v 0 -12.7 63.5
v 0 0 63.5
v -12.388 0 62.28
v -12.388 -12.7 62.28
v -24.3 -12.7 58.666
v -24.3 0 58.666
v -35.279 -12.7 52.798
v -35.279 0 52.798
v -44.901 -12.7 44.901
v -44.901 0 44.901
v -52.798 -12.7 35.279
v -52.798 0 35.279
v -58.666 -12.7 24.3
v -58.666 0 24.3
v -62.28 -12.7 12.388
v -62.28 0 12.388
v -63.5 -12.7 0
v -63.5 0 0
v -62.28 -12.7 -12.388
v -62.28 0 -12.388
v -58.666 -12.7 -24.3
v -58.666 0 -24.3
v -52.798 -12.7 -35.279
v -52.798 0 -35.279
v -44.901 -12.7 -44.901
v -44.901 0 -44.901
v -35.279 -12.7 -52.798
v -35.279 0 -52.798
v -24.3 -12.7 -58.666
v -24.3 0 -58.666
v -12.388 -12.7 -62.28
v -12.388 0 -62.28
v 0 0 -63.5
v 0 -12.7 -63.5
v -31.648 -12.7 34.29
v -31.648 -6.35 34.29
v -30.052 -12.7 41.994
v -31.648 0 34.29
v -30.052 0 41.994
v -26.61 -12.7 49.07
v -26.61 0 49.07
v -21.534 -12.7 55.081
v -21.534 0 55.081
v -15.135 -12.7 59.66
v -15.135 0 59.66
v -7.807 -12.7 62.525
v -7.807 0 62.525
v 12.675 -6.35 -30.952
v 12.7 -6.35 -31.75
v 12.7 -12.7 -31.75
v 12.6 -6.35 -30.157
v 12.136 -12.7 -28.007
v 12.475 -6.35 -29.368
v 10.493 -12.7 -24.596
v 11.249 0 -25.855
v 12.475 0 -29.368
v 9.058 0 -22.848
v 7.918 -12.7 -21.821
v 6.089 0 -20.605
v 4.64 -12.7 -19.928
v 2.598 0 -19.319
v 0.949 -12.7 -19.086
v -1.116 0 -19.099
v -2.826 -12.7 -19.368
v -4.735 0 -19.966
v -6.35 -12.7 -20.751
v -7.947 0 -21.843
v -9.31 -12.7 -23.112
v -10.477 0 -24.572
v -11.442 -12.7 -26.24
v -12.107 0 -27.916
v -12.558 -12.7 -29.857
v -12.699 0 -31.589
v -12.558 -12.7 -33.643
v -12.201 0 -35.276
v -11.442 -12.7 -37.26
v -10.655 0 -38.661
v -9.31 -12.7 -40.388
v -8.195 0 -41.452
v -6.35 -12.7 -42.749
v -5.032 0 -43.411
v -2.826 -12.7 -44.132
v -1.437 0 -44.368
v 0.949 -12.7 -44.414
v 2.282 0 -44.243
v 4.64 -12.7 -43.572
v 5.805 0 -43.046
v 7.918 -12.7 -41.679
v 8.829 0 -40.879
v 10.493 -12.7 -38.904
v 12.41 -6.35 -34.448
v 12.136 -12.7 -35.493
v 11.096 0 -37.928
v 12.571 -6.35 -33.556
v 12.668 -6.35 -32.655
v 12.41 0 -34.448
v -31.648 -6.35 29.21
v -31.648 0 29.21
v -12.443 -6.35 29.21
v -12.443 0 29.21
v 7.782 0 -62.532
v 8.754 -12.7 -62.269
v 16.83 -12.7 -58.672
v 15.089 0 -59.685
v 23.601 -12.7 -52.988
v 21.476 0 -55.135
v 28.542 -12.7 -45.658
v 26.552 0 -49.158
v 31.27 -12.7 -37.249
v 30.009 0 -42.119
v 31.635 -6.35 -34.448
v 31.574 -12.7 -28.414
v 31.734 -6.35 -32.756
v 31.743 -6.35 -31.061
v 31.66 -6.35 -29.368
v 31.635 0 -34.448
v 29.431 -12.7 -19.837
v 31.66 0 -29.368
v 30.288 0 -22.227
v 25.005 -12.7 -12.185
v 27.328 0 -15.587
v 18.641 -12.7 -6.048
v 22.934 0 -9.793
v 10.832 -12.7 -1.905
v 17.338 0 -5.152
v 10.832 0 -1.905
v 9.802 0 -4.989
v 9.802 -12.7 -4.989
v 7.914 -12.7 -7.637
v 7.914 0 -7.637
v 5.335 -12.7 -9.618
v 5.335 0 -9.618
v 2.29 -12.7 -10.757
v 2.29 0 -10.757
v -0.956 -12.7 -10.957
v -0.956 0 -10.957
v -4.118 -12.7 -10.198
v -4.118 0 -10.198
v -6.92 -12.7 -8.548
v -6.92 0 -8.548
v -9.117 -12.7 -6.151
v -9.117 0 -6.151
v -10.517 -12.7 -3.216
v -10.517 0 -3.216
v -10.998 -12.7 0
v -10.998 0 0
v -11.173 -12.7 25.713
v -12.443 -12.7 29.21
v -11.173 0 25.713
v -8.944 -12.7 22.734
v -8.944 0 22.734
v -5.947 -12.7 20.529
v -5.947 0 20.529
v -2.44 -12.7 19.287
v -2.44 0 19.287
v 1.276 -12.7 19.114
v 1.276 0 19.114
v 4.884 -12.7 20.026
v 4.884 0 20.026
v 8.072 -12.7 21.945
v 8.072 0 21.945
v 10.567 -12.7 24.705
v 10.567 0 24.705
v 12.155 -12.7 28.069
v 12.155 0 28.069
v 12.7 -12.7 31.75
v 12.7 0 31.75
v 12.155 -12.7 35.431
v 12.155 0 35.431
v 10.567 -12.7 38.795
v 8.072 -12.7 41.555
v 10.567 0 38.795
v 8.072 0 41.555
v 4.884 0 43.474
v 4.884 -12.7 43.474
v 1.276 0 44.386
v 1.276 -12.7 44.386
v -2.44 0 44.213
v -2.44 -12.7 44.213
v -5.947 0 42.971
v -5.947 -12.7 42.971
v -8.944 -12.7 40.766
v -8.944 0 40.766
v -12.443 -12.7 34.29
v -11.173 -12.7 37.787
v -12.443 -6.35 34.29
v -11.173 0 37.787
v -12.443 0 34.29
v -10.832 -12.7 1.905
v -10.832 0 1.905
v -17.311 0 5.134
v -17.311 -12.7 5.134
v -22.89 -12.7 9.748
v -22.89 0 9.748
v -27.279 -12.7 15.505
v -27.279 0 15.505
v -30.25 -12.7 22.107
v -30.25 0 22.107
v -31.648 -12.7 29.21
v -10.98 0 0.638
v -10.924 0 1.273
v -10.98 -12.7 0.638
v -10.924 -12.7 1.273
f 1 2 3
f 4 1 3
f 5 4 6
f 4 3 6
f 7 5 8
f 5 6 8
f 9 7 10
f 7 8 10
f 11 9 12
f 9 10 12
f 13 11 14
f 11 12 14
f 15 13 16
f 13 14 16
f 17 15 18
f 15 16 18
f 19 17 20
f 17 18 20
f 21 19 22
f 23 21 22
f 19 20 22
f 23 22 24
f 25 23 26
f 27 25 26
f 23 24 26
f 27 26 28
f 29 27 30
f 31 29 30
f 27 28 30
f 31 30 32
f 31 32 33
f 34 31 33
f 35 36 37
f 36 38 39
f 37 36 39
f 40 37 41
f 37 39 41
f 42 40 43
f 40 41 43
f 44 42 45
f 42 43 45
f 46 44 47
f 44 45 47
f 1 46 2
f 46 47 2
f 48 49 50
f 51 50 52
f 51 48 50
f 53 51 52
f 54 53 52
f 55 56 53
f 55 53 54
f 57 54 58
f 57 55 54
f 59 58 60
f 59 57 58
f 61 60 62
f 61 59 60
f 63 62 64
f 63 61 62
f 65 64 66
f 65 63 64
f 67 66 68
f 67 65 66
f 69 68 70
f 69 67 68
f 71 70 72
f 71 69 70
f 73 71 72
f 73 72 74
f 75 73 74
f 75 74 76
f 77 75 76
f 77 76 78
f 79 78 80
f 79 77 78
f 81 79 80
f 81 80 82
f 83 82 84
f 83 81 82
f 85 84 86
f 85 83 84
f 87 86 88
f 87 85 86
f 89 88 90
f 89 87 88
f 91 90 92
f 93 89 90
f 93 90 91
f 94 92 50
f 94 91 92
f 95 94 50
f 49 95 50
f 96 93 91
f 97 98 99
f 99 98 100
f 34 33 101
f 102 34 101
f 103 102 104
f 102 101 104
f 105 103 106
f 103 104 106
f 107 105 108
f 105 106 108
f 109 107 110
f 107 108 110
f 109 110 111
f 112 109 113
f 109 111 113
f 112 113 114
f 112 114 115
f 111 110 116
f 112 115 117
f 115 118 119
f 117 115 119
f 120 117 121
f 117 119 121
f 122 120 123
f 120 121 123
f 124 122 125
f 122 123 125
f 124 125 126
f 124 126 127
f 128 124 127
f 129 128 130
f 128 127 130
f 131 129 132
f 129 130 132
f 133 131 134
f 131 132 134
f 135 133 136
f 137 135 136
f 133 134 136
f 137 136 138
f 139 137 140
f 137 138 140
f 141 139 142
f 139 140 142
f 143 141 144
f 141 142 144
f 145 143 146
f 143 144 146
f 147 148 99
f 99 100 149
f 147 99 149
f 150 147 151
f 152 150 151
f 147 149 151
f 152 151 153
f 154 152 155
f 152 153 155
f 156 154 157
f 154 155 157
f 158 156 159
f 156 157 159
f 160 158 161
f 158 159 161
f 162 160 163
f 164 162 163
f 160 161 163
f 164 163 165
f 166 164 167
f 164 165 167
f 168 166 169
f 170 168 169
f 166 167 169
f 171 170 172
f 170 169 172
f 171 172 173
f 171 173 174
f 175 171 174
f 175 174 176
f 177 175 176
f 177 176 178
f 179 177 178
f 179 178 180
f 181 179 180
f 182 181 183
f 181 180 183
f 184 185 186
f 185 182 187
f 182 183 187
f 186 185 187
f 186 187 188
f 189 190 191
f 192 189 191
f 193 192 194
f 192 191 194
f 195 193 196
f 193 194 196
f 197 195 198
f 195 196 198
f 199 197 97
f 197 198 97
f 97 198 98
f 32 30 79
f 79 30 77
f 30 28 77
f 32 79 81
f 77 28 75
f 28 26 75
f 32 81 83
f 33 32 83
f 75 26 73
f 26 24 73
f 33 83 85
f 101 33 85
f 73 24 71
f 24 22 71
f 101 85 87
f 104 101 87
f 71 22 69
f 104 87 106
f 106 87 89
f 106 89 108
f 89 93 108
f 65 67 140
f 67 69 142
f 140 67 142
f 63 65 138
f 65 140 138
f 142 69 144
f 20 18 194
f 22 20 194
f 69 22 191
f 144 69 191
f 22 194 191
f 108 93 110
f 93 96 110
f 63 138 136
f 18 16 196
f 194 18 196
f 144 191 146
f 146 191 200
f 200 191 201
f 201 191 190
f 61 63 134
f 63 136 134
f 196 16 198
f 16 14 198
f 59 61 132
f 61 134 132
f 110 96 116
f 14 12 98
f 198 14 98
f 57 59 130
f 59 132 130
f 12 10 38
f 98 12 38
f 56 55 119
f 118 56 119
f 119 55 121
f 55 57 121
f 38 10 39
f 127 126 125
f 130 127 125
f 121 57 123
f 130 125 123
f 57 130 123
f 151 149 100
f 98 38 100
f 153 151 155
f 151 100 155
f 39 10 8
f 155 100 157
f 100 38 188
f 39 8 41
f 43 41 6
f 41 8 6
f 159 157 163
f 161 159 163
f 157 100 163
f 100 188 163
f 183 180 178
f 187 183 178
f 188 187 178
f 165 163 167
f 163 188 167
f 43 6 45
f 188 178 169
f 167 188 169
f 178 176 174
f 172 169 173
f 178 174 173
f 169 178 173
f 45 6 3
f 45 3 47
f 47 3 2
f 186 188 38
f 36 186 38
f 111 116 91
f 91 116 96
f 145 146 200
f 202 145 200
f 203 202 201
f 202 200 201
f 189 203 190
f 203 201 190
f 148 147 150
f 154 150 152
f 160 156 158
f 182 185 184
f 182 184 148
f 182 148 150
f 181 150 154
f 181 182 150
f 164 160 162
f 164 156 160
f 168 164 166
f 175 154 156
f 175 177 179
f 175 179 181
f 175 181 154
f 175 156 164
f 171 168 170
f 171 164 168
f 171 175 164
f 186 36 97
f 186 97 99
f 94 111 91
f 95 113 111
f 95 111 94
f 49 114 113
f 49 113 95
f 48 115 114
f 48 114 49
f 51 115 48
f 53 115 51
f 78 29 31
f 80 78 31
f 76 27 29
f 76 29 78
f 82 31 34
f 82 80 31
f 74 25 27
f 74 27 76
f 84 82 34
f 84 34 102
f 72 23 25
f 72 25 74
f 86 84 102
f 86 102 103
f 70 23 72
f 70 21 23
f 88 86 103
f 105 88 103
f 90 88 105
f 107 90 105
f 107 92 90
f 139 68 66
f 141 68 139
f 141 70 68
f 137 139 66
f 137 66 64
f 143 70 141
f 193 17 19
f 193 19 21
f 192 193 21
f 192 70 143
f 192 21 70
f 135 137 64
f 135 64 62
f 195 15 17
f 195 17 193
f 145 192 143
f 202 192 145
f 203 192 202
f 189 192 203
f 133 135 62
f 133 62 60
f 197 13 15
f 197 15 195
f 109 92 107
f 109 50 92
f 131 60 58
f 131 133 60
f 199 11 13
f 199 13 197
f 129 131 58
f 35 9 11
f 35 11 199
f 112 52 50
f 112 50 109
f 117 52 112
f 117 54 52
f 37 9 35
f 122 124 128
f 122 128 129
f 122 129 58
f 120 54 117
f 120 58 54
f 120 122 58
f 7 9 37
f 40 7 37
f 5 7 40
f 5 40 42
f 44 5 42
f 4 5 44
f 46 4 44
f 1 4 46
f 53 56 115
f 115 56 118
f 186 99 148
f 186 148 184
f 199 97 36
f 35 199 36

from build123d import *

# Parameters (mm, degrees)
F0_R     = 12.7
F1_DEPTH = 12.7
F3_DEPTH = 6.35
F4_W     = 19.2048290244
F4_H     = 5.08
F5_DEPTH = 6.35
F7_DEPTH = 25.4


with BuildPart() as f1:
    # F0 (on Front) → F1 (new body)
    with BuildSketch(Plane.XZ):
        with BuildLine():
            ThreePointArc((-31.6482369177, 34.29), (-21.5338976964, 55.0813898), (0, 63.5))
            ThreePointArc((0, 63.5), (-63.5, 0), (0, -63.5))
            ThreePointArc((0, -63.5), (31.75, -31.75), (0, 0))
            ThreePointArc((0, 0), (-21.5338976964, 8.4186102), (-31.6482369177, 29.21))
            Line((-31.6482369177, 29.21), (-12.4434078933, 29.21))
            ThreePointArc((-12.4434078933, 29.21), (12.7, 31.75), (-12.4434078933, 34.29))
            Line((-12.4434078933, 34.29), (-31.6482369177, 34.29))
        make_face()
        with Locations((0, -31.75)):
            Circle(F0_R, mode=Mode.SUBTRACT)
    extrude(amount=F1_DEPTH)

    # F2 (on face) → F3 (cut)
    with BuildSketch(Plane(origin=(0, 0, 0), x_dir=(-1, 0, 0), z_dir=(0, 1, 0))):
        with BuildLine():
            ThreePointArc((-12.410179803, -34.4476725629), (-12.6989804051, -31.910924424), (-12.4745547408, -29.3676725629))
            Line((-12.4745547408, -29.3676725629), (-31.6604961424, -29.3676725629))
            ThreePointArc((-31.6604961424, -29.3676725629), (-31.7496059696, -31.9081795626), (-31.6351870983, -34.4476725629))
            Line((-31.6351870983, -34.4476725629), (-12.410179803, -34.4476725629))
        make_face()
    extrude(amount=-F3_DEPTH, mode=Mode.SUBTRACT)

    # F4 (on face) → F5 (cut)
    with BuildSketch(Plane.XZ.offset(12.7)):
        with Locations((-22.0458224055, 31.75)):
            Rectangle(F4_W, F4_H)
    extrude(amount=-F5_DEPTH, mode=Mode.SUBTRACT)

    # F6 (on face) → F7 (cut)
    with BuildSketch(Plane(origin=(0, 0, 0), x_dir=(-1, 0, 0), z_dir=(0, 1, 0))):
        with BuildLine():
            ThreePointArc((-10.8319806145, -1.90488824), (0.9560632943, -10.9565663516), (10.9982, 0))
            ThreePointArc((10.9982, 0), (10.9565663516, 0.9560632943), (10.8319806145, 1.90488824))
            ThreePointArc((10.8319806145, 1.90488824), (5.4991, 0.4798481105), (0, 0))
            ThreePointArc((0, 0), (-5.4991, -0.4798481105), (-10.8319806145, -1.90488824))
        make_face()
    extrude(amount=-F7_DEPTH, mode=Mode.SUBTRACT)


solid = f1.part
